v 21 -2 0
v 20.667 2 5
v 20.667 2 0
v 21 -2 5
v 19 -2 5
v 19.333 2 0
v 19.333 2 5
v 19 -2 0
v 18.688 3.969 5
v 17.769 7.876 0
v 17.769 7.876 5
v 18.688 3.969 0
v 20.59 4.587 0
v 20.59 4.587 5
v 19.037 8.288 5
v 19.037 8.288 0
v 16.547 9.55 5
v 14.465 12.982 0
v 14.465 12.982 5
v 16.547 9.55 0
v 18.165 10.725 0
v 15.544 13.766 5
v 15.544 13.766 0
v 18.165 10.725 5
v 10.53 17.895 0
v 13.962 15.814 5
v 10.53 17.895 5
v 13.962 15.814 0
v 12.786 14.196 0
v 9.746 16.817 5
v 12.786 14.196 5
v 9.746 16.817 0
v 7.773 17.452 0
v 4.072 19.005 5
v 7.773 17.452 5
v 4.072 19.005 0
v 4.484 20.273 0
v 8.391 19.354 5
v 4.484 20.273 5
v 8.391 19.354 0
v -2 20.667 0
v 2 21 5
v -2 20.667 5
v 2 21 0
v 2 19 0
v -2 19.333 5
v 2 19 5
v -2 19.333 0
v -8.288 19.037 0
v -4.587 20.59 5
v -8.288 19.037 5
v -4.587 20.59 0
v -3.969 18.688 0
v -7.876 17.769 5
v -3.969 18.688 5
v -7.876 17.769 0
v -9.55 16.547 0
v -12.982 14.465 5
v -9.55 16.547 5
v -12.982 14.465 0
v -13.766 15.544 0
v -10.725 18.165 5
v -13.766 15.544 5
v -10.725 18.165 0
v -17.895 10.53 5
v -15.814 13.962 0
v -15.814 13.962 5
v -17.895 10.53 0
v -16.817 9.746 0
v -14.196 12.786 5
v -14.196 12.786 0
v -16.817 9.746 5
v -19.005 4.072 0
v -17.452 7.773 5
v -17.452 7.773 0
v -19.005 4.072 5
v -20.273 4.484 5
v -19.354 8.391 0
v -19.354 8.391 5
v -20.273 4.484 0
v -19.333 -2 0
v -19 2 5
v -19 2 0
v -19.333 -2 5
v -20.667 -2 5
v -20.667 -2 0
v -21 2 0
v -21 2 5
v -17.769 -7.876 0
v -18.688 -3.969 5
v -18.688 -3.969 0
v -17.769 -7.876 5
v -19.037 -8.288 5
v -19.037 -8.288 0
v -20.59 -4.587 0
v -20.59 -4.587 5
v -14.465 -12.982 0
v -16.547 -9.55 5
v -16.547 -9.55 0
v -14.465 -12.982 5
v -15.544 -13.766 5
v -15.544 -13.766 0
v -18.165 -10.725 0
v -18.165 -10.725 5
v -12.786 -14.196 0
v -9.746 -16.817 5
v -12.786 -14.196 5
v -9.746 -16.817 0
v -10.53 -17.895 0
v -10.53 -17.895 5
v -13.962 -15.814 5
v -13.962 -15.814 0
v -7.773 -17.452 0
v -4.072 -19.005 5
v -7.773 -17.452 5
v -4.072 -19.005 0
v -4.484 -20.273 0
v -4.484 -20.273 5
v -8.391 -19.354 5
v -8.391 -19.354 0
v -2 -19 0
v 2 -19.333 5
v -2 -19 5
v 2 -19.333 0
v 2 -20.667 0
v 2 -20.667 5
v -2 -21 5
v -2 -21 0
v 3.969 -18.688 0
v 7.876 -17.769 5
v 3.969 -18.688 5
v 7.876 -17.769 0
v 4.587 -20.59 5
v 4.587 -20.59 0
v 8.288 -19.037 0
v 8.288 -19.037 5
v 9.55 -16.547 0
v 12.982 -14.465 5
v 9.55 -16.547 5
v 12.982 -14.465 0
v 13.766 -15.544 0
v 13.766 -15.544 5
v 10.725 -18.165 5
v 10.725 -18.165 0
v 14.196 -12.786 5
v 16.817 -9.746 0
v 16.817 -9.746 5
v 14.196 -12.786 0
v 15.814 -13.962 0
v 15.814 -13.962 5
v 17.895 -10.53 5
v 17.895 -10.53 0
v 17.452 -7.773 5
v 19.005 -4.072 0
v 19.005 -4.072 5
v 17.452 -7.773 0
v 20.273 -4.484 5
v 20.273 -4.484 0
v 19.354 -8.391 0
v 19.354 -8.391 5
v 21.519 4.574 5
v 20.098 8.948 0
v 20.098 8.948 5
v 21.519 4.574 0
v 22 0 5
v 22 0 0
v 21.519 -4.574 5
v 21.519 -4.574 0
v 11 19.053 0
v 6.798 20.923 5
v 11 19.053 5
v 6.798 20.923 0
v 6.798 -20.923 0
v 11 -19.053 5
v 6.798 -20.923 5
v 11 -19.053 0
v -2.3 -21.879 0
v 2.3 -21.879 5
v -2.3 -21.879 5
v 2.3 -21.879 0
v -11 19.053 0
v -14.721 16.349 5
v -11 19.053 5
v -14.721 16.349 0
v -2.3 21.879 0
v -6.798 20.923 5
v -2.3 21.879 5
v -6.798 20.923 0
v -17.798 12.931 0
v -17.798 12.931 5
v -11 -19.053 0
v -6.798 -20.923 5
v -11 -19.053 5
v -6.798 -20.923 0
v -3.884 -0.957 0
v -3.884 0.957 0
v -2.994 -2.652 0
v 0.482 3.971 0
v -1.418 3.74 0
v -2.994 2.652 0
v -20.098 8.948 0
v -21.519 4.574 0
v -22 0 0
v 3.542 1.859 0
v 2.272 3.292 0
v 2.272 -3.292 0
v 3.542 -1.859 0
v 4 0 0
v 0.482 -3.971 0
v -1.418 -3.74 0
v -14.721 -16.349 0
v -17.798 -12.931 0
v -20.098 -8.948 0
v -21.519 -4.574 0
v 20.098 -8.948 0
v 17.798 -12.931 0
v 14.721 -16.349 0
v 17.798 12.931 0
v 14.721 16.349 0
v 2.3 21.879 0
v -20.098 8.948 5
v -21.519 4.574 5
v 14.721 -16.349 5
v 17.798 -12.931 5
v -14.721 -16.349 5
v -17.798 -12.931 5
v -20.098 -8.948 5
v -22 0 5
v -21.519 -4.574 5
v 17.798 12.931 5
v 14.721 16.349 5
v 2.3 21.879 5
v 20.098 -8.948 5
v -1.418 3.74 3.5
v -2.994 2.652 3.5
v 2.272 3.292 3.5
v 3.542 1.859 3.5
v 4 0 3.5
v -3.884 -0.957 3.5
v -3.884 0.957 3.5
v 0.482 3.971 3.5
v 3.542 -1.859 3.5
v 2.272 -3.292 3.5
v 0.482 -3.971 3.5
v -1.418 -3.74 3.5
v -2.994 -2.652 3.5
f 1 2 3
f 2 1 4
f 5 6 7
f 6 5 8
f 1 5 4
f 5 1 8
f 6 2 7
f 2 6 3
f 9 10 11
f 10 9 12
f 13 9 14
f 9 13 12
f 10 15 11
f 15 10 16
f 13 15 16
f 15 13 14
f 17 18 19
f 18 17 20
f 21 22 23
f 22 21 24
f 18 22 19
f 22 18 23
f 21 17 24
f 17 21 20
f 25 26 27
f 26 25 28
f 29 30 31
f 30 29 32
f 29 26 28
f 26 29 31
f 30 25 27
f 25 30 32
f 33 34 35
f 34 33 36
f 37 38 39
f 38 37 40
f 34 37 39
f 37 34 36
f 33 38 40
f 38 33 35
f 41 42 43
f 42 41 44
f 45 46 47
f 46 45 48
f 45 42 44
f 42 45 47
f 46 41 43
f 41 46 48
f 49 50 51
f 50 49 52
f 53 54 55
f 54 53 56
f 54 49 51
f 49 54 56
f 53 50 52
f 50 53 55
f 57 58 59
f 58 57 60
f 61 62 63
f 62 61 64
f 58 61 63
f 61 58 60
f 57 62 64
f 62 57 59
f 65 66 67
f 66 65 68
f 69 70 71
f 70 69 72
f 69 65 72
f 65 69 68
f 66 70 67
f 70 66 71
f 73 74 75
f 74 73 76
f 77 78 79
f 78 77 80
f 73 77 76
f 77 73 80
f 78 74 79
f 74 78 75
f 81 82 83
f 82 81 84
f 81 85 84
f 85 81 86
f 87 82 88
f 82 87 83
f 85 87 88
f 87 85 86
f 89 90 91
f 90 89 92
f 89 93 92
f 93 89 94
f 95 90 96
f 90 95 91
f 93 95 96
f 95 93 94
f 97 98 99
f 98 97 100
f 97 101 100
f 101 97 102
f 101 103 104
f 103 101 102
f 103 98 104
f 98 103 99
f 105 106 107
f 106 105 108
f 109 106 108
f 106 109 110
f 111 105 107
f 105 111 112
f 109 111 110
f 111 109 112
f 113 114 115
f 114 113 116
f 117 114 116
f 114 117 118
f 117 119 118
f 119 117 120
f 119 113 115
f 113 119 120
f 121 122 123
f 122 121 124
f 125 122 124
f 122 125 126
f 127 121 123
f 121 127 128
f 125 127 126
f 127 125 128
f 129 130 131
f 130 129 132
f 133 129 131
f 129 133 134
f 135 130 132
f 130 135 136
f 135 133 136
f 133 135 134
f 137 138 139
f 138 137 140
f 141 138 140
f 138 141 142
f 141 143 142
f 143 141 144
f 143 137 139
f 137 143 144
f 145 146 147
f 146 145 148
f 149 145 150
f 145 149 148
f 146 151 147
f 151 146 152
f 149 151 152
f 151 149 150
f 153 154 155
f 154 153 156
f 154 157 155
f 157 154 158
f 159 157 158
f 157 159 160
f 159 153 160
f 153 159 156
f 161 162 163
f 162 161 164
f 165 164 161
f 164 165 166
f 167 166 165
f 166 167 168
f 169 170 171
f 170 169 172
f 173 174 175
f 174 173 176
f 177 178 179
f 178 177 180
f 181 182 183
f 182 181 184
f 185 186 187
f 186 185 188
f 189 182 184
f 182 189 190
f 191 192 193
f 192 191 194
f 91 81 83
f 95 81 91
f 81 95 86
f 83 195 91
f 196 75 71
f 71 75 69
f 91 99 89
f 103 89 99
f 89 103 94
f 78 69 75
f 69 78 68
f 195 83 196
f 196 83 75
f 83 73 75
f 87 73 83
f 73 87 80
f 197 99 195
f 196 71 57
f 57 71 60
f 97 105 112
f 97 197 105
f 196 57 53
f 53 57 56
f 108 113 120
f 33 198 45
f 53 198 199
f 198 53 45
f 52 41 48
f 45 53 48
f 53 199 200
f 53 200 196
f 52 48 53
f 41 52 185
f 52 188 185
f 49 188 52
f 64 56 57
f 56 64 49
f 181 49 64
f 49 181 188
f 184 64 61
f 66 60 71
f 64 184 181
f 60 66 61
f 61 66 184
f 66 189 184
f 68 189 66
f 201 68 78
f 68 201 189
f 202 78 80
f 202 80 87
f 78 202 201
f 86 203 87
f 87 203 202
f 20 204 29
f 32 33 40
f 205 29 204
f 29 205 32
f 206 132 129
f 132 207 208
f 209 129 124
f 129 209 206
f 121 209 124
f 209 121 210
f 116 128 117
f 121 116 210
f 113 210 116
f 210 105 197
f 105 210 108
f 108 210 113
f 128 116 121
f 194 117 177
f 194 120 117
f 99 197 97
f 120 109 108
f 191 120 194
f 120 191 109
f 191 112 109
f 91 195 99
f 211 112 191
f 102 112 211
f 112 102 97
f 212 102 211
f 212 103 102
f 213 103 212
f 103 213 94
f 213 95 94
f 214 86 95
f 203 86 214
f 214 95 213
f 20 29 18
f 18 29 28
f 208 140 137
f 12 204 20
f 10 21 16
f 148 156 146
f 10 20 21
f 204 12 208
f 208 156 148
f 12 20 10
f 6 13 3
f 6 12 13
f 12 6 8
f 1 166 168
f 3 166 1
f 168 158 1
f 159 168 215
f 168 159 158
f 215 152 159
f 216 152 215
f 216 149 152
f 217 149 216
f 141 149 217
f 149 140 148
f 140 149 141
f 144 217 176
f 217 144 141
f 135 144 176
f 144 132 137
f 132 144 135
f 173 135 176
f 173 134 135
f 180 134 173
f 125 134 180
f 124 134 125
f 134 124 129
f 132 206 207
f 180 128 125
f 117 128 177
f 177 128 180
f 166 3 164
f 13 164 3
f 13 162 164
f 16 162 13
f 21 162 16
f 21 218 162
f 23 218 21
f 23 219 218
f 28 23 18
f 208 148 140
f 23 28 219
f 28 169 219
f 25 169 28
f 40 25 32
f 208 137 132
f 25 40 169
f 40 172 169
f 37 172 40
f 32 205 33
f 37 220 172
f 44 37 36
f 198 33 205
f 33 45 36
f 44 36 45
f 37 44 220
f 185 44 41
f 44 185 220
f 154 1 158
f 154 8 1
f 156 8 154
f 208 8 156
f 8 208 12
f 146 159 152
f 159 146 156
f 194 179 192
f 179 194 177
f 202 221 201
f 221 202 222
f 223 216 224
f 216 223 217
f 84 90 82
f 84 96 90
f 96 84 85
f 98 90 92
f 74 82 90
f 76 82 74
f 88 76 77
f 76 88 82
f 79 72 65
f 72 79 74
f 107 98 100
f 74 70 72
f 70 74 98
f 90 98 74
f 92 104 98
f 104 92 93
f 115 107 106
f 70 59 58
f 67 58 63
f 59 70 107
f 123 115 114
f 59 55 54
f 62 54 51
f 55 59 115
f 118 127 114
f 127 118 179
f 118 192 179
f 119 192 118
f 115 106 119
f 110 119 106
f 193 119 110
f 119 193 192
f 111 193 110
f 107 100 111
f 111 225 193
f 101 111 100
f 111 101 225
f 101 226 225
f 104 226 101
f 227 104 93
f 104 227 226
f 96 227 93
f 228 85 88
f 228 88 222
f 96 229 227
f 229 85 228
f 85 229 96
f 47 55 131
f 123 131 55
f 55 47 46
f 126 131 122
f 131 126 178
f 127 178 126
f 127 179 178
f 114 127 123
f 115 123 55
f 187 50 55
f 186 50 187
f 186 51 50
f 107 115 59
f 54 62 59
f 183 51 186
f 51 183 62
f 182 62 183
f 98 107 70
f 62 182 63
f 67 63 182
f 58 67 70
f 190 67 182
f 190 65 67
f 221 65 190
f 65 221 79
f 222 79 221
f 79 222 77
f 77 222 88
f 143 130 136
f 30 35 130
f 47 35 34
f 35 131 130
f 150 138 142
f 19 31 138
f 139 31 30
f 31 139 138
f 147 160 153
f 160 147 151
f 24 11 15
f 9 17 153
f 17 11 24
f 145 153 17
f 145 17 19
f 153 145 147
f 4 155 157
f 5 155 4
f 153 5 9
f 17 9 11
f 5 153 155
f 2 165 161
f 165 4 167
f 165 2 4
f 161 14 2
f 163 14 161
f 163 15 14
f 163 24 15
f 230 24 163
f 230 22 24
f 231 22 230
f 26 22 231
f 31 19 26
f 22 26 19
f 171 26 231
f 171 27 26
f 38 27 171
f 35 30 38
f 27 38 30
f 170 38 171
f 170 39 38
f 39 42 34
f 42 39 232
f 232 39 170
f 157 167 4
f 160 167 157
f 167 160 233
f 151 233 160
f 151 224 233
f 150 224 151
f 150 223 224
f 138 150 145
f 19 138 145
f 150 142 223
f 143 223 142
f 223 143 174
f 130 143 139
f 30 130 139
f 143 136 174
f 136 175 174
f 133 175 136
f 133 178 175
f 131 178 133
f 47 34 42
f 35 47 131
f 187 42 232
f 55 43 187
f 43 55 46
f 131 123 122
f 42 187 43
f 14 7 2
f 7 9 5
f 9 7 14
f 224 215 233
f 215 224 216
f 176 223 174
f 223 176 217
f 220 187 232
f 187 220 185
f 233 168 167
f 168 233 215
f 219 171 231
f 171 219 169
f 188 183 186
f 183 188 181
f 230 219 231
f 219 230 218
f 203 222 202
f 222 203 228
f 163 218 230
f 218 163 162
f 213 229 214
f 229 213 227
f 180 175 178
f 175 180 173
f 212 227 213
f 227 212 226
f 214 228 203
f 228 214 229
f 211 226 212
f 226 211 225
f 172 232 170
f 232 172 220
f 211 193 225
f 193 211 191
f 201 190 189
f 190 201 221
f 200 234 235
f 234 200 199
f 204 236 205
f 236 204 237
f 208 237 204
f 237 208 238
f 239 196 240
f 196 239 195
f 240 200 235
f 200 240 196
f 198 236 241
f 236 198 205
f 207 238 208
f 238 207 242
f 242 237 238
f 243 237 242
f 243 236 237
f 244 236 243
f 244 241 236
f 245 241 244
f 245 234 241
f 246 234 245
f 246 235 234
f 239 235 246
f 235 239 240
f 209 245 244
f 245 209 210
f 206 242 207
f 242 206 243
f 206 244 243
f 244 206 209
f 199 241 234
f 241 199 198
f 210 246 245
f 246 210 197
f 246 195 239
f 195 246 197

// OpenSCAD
// parametric_gear.scad - Advanced Parametric Gear Example
// This shows advanced techniques: parametric design, loops, mathematical calculations

// Gear parameters
teeth = 20;           // Number of teeth
module_size = 2;      // Size of gear teeth
pressure_angle = 20;  // Pressure angle in degrees
thickness = 5;        // Gear thickness
bore_diameter = 8;    // Center hole diameter

// Calculate gear dimensions
pitch_diameter = teeth * module_size;
outer_diameter = pitch_diameter + 2 * module_size;
root_diameter = pitch_diameter - 2.5 * module_size;

// Main gear
difference() {
    // Gear body
    cylinder(d = outer_diameter, h = thickness);
    
    // Center bore
    cylinder(d = bore_diameter, h = thickness + 2, center = true);
    
    // Gear teeth (subtractive method)
    for (i = [0:teeth-1]) {
        rotate([0, 0, i * 360/teeth]) {
            translate([pitch_diameter/2, 0, -1])
                gear_tooth_cutout();
        }
    }
}

// Module for individual tooth cutout
module gear_tooth_cutout() {
    // Create tooth profile using involute curve approximation
    linear_extrude(height = thickness + 2) {
        polygon([
            [-module_size/2, -module_size],
            [module_size/2, -module_size], 
            [module_size/3, module_size],
            [-module_size/3, module_size]
        ]);
    }
}

// Optional: Add hub reinforcement
difference() {
    cylinder(d = bore_diameter + 6, h = thickness);
    cylinder(d = bore_diameter, h = thickness + 2, center = true);
}
